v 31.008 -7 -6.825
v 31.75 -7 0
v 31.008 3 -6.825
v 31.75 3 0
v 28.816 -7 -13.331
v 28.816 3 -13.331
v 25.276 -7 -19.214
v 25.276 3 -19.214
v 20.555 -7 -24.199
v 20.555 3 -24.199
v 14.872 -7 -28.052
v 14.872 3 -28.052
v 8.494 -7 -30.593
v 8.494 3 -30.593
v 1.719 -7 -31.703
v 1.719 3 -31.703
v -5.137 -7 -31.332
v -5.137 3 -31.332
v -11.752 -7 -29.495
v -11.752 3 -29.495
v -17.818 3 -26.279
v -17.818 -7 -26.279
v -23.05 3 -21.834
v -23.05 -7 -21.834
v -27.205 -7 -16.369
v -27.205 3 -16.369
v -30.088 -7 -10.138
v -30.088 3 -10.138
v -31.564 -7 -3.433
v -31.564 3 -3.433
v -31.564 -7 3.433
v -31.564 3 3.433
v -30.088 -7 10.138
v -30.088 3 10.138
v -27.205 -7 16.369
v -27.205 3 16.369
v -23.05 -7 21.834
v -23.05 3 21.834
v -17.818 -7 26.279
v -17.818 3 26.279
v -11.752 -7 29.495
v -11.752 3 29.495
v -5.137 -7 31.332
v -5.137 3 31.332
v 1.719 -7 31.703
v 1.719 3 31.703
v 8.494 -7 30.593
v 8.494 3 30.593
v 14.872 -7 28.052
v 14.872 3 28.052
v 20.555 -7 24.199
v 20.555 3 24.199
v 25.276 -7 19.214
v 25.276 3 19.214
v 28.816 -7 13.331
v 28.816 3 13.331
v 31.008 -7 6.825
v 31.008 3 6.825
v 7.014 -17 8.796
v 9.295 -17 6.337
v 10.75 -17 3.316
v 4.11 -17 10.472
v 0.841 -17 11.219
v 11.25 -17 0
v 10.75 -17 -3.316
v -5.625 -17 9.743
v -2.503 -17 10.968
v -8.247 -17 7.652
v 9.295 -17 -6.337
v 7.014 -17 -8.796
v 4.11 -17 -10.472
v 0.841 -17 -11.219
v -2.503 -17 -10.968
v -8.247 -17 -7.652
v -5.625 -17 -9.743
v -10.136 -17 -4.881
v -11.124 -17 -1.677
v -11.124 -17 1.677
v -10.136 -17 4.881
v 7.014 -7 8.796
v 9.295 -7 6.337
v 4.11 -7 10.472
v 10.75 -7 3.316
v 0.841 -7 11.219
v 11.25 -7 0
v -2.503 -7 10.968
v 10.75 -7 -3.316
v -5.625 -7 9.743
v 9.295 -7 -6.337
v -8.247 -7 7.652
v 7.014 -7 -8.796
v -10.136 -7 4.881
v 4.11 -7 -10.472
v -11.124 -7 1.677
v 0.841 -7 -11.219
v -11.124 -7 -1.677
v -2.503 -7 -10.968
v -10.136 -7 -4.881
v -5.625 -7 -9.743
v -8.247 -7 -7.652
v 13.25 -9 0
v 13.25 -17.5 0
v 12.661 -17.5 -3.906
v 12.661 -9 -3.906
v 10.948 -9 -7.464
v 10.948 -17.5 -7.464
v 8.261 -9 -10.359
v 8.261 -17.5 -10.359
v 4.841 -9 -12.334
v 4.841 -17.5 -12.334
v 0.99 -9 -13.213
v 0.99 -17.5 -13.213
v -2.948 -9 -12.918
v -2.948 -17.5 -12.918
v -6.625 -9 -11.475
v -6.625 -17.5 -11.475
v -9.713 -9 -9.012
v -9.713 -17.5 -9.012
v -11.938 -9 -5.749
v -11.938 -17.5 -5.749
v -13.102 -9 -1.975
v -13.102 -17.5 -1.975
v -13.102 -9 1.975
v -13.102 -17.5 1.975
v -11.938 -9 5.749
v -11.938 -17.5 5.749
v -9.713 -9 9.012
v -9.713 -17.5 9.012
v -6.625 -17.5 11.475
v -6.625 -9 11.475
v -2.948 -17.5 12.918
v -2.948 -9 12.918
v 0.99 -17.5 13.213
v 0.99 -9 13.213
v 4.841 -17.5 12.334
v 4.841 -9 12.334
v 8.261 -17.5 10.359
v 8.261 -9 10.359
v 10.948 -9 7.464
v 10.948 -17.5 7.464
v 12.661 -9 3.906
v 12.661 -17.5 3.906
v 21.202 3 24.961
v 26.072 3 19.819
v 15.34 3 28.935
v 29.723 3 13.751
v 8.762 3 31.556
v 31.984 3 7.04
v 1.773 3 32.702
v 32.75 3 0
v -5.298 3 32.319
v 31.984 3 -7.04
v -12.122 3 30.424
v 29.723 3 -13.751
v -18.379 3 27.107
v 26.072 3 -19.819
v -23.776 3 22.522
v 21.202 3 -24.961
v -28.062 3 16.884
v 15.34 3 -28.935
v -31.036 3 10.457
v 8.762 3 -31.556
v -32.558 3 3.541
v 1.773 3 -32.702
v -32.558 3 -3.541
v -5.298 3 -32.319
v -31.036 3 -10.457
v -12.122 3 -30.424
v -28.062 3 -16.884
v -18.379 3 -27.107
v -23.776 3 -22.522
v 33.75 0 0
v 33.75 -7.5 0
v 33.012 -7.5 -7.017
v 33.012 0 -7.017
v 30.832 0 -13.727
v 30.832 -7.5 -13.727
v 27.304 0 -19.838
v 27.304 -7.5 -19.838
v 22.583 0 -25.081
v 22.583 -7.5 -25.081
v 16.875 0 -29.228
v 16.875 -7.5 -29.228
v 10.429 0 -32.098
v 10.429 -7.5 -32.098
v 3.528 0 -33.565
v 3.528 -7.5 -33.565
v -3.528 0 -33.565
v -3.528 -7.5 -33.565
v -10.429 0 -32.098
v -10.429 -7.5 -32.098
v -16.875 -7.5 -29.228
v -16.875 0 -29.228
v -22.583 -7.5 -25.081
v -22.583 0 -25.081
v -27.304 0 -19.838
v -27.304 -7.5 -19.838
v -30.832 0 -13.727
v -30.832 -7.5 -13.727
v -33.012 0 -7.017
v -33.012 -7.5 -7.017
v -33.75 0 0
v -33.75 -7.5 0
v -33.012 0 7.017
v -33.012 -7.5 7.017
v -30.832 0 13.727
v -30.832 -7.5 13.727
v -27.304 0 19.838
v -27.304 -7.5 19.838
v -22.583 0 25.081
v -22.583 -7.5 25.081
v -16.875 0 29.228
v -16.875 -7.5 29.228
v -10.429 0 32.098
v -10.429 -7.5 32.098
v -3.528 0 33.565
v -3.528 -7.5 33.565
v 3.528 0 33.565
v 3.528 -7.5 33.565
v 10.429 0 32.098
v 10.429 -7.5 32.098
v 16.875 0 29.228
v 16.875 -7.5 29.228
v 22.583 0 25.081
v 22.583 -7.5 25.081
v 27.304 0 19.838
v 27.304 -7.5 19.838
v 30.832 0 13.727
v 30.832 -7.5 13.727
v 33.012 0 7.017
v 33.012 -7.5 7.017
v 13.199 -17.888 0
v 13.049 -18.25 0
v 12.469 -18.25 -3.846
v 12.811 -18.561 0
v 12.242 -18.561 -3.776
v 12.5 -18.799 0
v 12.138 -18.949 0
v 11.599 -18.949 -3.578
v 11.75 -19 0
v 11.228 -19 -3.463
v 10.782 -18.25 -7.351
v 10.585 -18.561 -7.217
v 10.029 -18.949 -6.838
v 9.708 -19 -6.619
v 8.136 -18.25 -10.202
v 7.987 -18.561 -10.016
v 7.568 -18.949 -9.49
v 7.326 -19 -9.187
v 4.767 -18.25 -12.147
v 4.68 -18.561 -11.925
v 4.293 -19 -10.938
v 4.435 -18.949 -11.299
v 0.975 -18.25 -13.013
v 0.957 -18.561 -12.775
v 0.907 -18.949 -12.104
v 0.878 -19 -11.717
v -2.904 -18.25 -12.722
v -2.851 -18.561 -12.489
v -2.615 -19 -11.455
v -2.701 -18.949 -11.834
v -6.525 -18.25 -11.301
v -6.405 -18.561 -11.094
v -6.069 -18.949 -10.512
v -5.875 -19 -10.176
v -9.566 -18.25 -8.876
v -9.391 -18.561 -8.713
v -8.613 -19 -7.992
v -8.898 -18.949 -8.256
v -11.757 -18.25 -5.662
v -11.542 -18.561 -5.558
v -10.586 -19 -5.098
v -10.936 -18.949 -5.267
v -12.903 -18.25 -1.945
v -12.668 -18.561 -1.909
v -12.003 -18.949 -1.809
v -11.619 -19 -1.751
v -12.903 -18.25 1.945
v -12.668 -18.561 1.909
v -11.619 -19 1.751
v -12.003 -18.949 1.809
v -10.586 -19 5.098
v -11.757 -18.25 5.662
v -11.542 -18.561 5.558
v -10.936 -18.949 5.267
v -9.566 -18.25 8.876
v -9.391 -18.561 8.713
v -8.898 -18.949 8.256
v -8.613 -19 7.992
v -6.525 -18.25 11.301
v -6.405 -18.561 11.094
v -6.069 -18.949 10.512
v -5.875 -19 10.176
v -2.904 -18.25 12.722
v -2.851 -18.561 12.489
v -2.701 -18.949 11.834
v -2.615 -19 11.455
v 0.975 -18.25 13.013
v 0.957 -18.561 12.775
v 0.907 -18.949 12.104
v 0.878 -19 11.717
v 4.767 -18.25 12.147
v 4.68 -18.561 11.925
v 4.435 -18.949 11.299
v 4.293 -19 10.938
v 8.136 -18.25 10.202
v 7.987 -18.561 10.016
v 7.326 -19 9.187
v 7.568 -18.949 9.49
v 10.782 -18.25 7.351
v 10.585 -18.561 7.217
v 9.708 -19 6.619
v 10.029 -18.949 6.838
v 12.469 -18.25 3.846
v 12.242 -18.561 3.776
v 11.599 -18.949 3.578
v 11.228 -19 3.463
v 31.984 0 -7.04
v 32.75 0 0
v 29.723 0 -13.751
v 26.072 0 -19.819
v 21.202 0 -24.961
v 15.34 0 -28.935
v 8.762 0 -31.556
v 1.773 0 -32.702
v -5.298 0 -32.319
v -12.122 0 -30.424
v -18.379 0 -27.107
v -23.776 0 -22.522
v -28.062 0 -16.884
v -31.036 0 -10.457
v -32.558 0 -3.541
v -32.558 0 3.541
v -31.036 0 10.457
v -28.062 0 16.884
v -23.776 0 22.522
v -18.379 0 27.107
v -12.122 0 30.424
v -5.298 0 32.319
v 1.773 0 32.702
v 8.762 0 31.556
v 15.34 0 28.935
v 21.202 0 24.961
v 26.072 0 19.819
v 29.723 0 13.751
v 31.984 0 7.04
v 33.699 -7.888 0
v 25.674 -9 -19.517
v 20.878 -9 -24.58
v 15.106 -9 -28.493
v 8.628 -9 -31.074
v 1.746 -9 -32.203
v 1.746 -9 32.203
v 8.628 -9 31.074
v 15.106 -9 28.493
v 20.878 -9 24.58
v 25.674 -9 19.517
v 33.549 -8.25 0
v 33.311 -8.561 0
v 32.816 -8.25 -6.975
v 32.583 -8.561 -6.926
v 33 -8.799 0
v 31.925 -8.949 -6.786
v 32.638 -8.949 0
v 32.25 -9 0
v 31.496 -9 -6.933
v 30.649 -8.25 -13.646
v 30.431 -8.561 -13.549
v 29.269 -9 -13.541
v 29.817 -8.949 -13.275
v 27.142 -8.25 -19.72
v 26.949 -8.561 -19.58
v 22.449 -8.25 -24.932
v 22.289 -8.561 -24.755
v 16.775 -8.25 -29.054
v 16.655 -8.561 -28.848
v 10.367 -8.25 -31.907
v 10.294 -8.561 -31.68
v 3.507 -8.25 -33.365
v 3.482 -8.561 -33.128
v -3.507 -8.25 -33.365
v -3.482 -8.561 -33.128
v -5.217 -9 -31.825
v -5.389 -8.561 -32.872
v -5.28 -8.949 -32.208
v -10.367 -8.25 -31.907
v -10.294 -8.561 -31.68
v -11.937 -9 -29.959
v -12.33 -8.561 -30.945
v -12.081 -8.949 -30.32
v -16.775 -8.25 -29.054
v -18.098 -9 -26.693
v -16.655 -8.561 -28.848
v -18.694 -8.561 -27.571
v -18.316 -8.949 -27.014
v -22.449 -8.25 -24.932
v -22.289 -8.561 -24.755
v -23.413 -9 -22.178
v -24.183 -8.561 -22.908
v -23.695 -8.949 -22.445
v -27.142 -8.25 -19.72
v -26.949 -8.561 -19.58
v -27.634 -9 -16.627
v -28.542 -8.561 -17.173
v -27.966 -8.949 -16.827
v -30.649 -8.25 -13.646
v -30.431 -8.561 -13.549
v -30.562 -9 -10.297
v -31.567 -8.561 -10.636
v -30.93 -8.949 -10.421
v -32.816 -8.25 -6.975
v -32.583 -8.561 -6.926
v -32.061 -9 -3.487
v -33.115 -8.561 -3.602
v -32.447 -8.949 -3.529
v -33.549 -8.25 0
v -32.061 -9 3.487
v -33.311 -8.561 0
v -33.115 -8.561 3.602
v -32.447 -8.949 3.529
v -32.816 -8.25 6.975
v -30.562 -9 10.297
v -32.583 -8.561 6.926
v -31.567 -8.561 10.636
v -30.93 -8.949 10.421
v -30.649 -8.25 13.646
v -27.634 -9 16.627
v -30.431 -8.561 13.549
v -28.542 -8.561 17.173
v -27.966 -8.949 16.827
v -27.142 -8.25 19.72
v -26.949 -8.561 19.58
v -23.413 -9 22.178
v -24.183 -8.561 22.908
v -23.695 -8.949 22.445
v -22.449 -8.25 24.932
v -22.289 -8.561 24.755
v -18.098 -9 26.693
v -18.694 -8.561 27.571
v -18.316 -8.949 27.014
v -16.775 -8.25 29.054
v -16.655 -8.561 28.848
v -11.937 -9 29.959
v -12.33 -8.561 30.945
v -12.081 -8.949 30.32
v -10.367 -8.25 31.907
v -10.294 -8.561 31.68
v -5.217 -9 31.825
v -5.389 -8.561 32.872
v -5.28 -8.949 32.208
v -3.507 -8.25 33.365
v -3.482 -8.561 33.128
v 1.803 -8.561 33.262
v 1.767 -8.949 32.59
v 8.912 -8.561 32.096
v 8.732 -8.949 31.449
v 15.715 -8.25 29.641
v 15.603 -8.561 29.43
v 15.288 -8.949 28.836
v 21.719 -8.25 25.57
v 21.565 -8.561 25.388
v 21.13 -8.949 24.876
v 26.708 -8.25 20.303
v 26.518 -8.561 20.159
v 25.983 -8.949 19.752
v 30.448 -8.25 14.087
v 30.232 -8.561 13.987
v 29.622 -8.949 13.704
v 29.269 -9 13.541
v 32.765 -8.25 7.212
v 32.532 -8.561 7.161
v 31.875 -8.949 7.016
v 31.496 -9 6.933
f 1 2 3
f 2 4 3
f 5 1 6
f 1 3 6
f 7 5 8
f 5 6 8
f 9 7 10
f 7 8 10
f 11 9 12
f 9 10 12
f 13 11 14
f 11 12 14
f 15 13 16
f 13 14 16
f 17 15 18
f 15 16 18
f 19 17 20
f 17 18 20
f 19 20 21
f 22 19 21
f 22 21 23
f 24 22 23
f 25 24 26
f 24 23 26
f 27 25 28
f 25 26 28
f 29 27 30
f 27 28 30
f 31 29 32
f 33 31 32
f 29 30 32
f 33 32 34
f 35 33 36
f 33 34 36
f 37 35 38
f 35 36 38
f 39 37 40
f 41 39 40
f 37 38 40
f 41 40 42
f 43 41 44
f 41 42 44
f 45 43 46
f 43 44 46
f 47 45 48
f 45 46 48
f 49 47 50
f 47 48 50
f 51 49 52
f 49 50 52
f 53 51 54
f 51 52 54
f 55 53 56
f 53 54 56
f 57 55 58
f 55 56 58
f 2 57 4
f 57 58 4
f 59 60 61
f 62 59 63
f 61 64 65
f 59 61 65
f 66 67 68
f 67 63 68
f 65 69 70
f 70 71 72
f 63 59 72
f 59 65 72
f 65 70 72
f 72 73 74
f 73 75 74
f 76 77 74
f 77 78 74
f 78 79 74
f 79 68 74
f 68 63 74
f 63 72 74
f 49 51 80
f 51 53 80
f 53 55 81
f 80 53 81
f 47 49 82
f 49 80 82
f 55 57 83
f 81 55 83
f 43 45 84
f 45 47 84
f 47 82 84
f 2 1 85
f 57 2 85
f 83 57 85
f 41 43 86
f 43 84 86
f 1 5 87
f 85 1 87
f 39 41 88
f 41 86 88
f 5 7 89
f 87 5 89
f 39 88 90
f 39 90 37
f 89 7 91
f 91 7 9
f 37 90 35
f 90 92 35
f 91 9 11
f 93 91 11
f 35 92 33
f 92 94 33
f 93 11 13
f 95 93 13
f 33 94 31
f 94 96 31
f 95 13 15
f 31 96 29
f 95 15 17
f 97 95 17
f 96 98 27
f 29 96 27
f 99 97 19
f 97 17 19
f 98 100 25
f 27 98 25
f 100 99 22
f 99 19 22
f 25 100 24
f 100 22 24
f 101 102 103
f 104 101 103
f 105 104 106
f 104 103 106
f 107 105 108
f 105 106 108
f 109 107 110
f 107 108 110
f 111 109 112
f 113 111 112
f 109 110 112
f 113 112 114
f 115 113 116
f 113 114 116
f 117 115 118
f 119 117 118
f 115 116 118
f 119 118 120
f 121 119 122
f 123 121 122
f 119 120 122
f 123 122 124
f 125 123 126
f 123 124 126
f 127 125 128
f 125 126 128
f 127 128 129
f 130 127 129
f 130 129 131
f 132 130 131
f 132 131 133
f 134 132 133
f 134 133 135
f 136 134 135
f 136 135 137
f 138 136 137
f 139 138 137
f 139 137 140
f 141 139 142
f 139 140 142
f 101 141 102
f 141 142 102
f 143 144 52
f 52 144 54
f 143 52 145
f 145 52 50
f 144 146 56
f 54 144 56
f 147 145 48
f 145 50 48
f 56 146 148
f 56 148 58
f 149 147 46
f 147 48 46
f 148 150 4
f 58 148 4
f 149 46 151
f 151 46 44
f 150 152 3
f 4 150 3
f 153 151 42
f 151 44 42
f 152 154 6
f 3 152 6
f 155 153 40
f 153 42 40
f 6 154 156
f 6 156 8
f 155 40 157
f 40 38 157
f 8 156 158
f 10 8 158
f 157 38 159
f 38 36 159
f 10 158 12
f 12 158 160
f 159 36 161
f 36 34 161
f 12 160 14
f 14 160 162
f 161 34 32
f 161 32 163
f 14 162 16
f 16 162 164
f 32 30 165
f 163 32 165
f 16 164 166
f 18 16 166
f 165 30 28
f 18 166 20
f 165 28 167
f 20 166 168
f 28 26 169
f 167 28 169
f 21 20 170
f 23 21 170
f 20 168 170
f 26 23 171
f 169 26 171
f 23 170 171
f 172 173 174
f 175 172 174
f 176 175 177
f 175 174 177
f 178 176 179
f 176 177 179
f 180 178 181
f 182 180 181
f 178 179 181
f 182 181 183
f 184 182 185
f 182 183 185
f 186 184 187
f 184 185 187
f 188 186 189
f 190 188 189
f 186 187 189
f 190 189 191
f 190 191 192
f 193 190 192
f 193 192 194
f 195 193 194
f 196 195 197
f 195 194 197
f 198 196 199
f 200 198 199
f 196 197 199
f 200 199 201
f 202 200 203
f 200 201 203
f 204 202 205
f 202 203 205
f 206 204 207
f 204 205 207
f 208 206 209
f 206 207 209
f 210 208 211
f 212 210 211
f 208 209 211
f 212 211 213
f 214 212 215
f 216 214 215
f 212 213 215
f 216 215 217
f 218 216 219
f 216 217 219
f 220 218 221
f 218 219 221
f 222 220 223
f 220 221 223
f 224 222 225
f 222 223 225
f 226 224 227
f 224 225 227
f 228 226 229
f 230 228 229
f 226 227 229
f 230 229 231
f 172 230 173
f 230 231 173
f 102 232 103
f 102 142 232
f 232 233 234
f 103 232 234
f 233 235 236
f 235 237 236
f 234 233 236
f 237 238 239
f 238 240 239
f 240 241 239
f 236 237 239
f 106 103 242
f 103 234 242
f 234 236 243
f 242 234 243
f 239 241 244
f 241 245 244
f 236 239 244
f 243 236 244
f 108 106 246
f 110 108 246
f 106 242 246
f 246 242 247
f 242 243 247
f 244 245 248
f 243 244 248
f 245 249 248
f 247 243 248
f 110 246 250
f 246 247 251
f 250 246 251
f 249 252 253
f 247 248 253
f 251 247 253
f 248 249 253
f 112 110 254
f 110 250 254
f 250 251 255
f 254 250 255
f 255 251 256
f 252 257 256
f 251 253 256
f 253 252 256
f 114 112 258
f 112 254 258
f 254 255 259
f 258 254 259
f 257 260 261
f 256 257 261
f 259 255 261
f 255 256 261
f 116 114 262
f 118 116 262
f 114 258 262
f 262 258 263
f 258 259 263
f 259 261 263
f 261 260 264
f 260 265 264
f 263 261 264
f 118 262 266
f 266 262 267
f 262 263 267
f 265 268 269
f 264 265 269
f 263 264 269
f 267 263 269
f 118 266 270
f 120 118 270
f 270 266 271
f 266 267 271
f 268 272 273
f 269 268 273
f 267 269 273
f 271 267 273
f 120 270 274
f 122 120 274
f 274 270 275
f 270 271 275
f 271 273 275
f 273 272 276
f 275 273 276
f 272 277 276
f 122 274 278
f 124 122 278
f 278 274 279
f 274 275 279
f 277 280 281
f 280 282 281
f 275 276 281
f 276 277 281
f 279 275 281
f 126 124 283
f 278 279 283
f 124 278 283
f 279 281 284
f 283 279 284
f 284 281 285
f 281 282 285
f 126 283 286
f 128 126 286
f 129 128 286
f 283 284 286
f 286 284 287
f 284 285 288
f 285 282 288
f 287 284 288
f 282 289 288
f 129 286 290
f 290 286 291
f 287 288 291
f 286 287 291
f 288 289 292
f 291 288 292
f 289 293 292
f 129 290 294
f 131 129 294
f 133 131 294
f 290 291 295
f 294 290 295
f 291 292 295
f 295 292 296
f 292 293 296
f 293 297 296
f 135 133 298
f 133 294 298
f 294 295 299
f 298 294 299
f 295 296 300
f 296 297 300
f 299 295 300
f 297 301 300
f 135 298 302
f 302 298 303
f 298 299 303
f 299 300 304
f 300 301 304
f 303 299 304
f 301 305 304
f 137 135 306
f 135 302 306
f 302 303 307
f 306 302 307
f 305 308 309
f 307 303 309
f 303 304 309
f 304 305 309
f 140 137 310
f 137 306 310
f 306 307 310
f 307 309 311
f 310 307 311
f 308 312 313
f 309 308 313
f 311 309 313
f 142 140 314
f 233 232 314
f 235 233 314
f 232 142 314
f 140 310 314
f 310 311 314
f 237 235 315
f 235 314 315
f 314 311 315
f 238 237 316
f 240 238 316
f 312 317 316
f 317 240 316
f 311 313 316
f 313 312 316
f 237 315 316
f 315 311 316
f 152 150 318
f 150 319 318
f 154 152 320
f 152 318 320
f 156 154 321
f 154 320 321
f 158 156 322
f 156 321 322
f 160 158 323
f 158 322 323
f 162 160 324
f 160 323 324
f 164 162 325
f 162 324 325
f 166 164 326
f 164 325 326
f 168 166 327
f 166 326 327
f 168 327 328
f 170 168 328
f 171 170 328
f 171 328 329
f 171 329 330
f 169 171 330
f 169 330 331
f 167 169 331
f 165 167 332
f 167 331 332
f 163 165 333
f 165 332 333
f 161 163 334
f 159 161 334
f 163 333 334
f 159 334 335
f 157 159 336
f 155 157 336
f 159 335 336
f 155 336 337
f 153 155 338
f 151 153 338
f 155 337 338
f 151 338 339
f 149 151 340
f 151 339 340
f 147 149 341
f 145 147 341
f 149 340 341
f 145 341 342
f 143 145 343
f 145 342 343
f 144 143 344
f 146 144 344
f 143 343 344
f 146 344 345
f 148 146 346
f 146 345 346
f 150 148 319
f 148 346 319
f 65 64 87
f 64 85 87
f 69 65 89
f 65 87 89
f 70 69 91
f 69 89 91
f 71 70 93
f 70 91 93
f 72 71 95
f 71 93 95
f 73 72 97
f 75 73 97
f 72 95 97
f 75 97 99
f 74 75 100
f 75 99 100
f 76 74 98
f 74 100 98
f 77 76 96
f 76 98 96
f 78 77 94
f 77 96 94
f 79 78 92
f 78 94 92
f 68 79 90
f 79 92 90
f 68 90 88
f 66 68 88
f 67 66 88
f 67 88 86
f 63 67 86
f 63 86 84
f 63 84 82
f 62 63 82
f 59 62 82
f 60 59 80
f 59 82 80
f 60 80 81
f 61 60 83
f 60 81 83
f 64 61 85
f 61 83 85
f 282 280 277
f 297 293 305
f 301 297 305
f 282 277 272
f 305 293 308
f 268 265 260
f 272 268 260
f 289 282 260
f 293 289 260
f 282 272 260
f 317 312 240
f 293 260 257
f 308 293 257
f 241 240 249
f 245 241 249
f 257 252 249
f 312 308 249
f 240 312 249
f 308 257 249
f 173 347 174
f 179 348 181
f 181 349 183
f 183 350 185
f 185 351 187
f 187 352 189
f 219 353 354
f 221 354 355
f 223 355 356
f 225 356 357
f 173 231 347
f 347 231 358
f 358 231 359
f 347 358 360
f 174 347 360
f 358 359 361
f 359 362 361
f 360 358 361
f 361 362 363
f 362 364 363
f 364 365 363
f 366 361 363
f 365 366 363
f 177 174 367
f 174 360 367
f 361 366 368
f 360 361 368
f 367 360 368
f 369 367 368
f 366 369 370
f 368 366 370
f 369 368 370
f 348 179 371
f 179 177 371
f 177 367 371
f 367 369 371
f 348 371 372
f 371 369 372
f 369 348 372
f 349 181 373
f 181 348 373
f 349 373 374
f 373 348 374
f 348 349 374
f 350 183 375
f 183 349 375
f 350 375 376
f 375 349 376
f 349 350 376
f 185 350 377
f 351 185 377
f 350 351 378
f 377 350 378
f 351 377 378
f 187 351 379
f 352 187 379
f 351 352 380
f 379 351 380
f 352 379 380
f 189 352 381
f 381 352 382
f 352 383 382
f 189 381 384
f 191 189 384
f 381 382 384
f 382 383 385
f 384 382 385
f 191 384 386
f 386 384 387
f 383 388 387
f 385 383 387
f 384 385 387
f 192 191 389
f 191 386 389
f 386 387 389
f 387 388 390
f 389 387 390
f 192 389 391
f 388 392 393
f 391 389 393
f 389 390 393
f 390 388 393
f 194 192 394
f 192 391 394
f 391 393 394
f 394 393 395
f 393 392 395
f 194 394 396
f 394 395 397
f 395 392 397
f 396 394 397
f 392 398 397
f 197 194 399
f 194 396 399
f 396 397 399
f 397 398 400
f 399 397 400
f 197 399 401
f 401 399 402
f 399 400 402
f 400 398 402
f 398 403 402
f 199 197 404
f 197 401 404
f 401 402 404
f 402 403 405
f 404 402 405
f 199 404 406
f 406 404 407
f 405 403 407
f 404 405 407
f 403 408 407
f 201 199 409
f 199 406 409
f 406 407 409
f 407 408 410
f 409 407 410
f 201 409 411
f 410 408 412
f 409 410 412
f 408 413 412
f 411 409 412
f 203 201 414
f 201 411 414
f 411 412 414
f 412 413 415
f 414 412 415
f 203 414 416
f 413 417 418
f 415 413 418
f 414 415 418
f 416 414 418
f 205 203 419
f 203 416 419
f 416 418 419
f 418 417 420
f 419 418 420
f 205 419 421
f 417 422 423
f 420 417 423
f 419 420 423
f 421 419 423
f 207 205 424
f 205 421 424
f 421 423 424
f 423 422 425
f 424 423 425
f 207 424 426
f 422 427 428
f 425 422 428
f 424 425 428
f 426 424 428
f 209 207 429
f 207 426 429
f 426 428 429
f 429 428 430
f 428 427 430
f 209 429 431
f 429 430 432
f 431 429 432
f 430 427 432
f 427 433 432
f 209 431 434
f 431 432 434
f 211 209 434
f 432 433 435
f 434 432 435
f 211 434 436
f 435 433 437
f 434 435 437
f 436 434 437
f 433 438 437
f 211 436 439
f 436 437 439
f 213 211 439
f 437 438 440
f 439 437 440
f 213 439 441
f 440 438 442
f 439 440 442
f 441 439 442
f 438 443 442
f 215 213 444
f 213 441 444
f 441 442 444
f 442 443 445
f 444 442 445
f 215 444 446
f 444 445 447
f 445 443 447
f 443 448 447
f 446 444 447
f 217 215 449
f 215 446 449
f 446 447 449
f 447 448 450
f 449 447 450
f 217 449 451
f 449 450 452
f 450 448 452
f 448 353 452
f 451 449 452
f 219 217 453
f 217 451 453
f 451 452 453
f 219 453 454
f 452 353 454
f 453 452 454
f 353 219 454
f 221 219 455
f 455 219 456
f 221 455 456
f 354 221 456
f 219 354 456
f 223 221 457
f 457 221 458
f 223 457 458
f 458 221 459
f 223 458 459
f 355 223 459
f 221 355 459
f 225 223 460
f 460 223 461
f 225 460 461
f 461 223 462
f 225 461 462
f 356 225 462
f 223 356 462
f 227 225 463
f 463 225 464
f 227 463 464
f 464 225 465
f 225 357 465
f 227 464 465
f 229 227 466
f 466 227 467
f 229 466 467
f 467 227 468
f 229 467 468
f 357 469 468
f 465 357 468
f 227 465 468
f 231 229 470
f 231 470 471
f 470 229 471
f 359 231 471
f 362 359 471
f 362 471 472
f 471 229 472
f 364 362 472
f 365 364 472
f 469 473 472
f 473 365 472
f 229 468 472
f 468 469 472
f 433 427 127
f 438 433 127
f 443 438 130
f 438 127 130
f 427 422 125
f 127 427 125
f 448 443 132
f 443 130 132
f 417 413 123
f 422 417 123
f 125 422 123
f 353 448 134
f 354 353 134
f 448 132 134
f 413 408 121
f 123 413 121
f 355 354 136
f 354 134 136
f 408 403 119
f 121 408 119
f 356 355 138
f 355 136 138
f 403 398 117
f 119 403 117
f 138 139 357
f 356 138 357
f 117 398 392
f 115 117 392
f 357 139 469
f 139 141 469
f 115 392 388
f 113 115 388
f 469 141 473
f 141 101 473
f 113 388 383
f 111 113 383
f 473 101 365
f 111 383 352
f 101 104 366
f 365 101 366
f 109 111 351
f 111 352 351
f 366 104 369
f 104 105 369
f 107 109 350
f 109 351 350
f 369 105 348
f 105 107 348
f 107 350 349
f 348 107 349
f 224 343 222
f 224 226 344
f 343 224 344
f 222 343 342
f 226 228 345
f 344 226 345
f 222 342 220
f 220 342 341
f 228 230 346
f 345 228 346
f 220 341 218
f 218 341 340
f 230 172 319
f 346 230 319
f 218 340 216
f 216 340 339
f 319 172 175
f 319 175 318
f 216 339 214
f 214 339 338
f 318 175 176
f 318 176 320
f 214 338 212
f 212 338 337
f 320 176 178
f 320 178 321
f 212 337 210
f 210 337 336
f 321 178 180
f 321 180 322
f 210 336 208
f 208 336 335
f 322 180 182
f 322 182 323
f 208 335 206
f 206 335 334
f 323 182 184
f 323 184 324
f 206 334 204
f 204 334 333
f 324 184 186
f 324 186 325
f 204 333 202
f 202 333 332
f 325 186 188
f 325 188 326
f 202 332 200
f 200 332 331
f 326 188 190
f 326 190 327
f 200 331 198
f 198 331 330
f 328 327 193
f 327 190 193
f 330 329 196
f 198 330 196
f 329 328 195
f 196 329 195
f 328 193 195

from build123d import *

# Parameters (mm, degrees)
FILLET1_R = 1.5


with BuildPart() as part:
    # Sketch1 → Revolve1 (revolve)
    with BuildSketch(Plane.XY):
        Polygon((33.75, 0), (33.75, -9), (13.25, -9), (13.25, -19), (0, -19), (0, -17), (11.25, -17), (11.25, -7), (31.75, -7), (31.75, 3), (32.75, 3), (32.75, 0), align=None)
    revolve(axis=Axis((0, -19, 0), (0, 1, 0)))

    # Fillet1
    fillet1_edges = [part.edges().sort_by_distance(p)[0] for p in [
        (-13.25, -19, 0),
        (-33.75, -9, 0),
    ]]
    fillet(fillet1_edges, radius=FILLET1_R)


solid = part.part
